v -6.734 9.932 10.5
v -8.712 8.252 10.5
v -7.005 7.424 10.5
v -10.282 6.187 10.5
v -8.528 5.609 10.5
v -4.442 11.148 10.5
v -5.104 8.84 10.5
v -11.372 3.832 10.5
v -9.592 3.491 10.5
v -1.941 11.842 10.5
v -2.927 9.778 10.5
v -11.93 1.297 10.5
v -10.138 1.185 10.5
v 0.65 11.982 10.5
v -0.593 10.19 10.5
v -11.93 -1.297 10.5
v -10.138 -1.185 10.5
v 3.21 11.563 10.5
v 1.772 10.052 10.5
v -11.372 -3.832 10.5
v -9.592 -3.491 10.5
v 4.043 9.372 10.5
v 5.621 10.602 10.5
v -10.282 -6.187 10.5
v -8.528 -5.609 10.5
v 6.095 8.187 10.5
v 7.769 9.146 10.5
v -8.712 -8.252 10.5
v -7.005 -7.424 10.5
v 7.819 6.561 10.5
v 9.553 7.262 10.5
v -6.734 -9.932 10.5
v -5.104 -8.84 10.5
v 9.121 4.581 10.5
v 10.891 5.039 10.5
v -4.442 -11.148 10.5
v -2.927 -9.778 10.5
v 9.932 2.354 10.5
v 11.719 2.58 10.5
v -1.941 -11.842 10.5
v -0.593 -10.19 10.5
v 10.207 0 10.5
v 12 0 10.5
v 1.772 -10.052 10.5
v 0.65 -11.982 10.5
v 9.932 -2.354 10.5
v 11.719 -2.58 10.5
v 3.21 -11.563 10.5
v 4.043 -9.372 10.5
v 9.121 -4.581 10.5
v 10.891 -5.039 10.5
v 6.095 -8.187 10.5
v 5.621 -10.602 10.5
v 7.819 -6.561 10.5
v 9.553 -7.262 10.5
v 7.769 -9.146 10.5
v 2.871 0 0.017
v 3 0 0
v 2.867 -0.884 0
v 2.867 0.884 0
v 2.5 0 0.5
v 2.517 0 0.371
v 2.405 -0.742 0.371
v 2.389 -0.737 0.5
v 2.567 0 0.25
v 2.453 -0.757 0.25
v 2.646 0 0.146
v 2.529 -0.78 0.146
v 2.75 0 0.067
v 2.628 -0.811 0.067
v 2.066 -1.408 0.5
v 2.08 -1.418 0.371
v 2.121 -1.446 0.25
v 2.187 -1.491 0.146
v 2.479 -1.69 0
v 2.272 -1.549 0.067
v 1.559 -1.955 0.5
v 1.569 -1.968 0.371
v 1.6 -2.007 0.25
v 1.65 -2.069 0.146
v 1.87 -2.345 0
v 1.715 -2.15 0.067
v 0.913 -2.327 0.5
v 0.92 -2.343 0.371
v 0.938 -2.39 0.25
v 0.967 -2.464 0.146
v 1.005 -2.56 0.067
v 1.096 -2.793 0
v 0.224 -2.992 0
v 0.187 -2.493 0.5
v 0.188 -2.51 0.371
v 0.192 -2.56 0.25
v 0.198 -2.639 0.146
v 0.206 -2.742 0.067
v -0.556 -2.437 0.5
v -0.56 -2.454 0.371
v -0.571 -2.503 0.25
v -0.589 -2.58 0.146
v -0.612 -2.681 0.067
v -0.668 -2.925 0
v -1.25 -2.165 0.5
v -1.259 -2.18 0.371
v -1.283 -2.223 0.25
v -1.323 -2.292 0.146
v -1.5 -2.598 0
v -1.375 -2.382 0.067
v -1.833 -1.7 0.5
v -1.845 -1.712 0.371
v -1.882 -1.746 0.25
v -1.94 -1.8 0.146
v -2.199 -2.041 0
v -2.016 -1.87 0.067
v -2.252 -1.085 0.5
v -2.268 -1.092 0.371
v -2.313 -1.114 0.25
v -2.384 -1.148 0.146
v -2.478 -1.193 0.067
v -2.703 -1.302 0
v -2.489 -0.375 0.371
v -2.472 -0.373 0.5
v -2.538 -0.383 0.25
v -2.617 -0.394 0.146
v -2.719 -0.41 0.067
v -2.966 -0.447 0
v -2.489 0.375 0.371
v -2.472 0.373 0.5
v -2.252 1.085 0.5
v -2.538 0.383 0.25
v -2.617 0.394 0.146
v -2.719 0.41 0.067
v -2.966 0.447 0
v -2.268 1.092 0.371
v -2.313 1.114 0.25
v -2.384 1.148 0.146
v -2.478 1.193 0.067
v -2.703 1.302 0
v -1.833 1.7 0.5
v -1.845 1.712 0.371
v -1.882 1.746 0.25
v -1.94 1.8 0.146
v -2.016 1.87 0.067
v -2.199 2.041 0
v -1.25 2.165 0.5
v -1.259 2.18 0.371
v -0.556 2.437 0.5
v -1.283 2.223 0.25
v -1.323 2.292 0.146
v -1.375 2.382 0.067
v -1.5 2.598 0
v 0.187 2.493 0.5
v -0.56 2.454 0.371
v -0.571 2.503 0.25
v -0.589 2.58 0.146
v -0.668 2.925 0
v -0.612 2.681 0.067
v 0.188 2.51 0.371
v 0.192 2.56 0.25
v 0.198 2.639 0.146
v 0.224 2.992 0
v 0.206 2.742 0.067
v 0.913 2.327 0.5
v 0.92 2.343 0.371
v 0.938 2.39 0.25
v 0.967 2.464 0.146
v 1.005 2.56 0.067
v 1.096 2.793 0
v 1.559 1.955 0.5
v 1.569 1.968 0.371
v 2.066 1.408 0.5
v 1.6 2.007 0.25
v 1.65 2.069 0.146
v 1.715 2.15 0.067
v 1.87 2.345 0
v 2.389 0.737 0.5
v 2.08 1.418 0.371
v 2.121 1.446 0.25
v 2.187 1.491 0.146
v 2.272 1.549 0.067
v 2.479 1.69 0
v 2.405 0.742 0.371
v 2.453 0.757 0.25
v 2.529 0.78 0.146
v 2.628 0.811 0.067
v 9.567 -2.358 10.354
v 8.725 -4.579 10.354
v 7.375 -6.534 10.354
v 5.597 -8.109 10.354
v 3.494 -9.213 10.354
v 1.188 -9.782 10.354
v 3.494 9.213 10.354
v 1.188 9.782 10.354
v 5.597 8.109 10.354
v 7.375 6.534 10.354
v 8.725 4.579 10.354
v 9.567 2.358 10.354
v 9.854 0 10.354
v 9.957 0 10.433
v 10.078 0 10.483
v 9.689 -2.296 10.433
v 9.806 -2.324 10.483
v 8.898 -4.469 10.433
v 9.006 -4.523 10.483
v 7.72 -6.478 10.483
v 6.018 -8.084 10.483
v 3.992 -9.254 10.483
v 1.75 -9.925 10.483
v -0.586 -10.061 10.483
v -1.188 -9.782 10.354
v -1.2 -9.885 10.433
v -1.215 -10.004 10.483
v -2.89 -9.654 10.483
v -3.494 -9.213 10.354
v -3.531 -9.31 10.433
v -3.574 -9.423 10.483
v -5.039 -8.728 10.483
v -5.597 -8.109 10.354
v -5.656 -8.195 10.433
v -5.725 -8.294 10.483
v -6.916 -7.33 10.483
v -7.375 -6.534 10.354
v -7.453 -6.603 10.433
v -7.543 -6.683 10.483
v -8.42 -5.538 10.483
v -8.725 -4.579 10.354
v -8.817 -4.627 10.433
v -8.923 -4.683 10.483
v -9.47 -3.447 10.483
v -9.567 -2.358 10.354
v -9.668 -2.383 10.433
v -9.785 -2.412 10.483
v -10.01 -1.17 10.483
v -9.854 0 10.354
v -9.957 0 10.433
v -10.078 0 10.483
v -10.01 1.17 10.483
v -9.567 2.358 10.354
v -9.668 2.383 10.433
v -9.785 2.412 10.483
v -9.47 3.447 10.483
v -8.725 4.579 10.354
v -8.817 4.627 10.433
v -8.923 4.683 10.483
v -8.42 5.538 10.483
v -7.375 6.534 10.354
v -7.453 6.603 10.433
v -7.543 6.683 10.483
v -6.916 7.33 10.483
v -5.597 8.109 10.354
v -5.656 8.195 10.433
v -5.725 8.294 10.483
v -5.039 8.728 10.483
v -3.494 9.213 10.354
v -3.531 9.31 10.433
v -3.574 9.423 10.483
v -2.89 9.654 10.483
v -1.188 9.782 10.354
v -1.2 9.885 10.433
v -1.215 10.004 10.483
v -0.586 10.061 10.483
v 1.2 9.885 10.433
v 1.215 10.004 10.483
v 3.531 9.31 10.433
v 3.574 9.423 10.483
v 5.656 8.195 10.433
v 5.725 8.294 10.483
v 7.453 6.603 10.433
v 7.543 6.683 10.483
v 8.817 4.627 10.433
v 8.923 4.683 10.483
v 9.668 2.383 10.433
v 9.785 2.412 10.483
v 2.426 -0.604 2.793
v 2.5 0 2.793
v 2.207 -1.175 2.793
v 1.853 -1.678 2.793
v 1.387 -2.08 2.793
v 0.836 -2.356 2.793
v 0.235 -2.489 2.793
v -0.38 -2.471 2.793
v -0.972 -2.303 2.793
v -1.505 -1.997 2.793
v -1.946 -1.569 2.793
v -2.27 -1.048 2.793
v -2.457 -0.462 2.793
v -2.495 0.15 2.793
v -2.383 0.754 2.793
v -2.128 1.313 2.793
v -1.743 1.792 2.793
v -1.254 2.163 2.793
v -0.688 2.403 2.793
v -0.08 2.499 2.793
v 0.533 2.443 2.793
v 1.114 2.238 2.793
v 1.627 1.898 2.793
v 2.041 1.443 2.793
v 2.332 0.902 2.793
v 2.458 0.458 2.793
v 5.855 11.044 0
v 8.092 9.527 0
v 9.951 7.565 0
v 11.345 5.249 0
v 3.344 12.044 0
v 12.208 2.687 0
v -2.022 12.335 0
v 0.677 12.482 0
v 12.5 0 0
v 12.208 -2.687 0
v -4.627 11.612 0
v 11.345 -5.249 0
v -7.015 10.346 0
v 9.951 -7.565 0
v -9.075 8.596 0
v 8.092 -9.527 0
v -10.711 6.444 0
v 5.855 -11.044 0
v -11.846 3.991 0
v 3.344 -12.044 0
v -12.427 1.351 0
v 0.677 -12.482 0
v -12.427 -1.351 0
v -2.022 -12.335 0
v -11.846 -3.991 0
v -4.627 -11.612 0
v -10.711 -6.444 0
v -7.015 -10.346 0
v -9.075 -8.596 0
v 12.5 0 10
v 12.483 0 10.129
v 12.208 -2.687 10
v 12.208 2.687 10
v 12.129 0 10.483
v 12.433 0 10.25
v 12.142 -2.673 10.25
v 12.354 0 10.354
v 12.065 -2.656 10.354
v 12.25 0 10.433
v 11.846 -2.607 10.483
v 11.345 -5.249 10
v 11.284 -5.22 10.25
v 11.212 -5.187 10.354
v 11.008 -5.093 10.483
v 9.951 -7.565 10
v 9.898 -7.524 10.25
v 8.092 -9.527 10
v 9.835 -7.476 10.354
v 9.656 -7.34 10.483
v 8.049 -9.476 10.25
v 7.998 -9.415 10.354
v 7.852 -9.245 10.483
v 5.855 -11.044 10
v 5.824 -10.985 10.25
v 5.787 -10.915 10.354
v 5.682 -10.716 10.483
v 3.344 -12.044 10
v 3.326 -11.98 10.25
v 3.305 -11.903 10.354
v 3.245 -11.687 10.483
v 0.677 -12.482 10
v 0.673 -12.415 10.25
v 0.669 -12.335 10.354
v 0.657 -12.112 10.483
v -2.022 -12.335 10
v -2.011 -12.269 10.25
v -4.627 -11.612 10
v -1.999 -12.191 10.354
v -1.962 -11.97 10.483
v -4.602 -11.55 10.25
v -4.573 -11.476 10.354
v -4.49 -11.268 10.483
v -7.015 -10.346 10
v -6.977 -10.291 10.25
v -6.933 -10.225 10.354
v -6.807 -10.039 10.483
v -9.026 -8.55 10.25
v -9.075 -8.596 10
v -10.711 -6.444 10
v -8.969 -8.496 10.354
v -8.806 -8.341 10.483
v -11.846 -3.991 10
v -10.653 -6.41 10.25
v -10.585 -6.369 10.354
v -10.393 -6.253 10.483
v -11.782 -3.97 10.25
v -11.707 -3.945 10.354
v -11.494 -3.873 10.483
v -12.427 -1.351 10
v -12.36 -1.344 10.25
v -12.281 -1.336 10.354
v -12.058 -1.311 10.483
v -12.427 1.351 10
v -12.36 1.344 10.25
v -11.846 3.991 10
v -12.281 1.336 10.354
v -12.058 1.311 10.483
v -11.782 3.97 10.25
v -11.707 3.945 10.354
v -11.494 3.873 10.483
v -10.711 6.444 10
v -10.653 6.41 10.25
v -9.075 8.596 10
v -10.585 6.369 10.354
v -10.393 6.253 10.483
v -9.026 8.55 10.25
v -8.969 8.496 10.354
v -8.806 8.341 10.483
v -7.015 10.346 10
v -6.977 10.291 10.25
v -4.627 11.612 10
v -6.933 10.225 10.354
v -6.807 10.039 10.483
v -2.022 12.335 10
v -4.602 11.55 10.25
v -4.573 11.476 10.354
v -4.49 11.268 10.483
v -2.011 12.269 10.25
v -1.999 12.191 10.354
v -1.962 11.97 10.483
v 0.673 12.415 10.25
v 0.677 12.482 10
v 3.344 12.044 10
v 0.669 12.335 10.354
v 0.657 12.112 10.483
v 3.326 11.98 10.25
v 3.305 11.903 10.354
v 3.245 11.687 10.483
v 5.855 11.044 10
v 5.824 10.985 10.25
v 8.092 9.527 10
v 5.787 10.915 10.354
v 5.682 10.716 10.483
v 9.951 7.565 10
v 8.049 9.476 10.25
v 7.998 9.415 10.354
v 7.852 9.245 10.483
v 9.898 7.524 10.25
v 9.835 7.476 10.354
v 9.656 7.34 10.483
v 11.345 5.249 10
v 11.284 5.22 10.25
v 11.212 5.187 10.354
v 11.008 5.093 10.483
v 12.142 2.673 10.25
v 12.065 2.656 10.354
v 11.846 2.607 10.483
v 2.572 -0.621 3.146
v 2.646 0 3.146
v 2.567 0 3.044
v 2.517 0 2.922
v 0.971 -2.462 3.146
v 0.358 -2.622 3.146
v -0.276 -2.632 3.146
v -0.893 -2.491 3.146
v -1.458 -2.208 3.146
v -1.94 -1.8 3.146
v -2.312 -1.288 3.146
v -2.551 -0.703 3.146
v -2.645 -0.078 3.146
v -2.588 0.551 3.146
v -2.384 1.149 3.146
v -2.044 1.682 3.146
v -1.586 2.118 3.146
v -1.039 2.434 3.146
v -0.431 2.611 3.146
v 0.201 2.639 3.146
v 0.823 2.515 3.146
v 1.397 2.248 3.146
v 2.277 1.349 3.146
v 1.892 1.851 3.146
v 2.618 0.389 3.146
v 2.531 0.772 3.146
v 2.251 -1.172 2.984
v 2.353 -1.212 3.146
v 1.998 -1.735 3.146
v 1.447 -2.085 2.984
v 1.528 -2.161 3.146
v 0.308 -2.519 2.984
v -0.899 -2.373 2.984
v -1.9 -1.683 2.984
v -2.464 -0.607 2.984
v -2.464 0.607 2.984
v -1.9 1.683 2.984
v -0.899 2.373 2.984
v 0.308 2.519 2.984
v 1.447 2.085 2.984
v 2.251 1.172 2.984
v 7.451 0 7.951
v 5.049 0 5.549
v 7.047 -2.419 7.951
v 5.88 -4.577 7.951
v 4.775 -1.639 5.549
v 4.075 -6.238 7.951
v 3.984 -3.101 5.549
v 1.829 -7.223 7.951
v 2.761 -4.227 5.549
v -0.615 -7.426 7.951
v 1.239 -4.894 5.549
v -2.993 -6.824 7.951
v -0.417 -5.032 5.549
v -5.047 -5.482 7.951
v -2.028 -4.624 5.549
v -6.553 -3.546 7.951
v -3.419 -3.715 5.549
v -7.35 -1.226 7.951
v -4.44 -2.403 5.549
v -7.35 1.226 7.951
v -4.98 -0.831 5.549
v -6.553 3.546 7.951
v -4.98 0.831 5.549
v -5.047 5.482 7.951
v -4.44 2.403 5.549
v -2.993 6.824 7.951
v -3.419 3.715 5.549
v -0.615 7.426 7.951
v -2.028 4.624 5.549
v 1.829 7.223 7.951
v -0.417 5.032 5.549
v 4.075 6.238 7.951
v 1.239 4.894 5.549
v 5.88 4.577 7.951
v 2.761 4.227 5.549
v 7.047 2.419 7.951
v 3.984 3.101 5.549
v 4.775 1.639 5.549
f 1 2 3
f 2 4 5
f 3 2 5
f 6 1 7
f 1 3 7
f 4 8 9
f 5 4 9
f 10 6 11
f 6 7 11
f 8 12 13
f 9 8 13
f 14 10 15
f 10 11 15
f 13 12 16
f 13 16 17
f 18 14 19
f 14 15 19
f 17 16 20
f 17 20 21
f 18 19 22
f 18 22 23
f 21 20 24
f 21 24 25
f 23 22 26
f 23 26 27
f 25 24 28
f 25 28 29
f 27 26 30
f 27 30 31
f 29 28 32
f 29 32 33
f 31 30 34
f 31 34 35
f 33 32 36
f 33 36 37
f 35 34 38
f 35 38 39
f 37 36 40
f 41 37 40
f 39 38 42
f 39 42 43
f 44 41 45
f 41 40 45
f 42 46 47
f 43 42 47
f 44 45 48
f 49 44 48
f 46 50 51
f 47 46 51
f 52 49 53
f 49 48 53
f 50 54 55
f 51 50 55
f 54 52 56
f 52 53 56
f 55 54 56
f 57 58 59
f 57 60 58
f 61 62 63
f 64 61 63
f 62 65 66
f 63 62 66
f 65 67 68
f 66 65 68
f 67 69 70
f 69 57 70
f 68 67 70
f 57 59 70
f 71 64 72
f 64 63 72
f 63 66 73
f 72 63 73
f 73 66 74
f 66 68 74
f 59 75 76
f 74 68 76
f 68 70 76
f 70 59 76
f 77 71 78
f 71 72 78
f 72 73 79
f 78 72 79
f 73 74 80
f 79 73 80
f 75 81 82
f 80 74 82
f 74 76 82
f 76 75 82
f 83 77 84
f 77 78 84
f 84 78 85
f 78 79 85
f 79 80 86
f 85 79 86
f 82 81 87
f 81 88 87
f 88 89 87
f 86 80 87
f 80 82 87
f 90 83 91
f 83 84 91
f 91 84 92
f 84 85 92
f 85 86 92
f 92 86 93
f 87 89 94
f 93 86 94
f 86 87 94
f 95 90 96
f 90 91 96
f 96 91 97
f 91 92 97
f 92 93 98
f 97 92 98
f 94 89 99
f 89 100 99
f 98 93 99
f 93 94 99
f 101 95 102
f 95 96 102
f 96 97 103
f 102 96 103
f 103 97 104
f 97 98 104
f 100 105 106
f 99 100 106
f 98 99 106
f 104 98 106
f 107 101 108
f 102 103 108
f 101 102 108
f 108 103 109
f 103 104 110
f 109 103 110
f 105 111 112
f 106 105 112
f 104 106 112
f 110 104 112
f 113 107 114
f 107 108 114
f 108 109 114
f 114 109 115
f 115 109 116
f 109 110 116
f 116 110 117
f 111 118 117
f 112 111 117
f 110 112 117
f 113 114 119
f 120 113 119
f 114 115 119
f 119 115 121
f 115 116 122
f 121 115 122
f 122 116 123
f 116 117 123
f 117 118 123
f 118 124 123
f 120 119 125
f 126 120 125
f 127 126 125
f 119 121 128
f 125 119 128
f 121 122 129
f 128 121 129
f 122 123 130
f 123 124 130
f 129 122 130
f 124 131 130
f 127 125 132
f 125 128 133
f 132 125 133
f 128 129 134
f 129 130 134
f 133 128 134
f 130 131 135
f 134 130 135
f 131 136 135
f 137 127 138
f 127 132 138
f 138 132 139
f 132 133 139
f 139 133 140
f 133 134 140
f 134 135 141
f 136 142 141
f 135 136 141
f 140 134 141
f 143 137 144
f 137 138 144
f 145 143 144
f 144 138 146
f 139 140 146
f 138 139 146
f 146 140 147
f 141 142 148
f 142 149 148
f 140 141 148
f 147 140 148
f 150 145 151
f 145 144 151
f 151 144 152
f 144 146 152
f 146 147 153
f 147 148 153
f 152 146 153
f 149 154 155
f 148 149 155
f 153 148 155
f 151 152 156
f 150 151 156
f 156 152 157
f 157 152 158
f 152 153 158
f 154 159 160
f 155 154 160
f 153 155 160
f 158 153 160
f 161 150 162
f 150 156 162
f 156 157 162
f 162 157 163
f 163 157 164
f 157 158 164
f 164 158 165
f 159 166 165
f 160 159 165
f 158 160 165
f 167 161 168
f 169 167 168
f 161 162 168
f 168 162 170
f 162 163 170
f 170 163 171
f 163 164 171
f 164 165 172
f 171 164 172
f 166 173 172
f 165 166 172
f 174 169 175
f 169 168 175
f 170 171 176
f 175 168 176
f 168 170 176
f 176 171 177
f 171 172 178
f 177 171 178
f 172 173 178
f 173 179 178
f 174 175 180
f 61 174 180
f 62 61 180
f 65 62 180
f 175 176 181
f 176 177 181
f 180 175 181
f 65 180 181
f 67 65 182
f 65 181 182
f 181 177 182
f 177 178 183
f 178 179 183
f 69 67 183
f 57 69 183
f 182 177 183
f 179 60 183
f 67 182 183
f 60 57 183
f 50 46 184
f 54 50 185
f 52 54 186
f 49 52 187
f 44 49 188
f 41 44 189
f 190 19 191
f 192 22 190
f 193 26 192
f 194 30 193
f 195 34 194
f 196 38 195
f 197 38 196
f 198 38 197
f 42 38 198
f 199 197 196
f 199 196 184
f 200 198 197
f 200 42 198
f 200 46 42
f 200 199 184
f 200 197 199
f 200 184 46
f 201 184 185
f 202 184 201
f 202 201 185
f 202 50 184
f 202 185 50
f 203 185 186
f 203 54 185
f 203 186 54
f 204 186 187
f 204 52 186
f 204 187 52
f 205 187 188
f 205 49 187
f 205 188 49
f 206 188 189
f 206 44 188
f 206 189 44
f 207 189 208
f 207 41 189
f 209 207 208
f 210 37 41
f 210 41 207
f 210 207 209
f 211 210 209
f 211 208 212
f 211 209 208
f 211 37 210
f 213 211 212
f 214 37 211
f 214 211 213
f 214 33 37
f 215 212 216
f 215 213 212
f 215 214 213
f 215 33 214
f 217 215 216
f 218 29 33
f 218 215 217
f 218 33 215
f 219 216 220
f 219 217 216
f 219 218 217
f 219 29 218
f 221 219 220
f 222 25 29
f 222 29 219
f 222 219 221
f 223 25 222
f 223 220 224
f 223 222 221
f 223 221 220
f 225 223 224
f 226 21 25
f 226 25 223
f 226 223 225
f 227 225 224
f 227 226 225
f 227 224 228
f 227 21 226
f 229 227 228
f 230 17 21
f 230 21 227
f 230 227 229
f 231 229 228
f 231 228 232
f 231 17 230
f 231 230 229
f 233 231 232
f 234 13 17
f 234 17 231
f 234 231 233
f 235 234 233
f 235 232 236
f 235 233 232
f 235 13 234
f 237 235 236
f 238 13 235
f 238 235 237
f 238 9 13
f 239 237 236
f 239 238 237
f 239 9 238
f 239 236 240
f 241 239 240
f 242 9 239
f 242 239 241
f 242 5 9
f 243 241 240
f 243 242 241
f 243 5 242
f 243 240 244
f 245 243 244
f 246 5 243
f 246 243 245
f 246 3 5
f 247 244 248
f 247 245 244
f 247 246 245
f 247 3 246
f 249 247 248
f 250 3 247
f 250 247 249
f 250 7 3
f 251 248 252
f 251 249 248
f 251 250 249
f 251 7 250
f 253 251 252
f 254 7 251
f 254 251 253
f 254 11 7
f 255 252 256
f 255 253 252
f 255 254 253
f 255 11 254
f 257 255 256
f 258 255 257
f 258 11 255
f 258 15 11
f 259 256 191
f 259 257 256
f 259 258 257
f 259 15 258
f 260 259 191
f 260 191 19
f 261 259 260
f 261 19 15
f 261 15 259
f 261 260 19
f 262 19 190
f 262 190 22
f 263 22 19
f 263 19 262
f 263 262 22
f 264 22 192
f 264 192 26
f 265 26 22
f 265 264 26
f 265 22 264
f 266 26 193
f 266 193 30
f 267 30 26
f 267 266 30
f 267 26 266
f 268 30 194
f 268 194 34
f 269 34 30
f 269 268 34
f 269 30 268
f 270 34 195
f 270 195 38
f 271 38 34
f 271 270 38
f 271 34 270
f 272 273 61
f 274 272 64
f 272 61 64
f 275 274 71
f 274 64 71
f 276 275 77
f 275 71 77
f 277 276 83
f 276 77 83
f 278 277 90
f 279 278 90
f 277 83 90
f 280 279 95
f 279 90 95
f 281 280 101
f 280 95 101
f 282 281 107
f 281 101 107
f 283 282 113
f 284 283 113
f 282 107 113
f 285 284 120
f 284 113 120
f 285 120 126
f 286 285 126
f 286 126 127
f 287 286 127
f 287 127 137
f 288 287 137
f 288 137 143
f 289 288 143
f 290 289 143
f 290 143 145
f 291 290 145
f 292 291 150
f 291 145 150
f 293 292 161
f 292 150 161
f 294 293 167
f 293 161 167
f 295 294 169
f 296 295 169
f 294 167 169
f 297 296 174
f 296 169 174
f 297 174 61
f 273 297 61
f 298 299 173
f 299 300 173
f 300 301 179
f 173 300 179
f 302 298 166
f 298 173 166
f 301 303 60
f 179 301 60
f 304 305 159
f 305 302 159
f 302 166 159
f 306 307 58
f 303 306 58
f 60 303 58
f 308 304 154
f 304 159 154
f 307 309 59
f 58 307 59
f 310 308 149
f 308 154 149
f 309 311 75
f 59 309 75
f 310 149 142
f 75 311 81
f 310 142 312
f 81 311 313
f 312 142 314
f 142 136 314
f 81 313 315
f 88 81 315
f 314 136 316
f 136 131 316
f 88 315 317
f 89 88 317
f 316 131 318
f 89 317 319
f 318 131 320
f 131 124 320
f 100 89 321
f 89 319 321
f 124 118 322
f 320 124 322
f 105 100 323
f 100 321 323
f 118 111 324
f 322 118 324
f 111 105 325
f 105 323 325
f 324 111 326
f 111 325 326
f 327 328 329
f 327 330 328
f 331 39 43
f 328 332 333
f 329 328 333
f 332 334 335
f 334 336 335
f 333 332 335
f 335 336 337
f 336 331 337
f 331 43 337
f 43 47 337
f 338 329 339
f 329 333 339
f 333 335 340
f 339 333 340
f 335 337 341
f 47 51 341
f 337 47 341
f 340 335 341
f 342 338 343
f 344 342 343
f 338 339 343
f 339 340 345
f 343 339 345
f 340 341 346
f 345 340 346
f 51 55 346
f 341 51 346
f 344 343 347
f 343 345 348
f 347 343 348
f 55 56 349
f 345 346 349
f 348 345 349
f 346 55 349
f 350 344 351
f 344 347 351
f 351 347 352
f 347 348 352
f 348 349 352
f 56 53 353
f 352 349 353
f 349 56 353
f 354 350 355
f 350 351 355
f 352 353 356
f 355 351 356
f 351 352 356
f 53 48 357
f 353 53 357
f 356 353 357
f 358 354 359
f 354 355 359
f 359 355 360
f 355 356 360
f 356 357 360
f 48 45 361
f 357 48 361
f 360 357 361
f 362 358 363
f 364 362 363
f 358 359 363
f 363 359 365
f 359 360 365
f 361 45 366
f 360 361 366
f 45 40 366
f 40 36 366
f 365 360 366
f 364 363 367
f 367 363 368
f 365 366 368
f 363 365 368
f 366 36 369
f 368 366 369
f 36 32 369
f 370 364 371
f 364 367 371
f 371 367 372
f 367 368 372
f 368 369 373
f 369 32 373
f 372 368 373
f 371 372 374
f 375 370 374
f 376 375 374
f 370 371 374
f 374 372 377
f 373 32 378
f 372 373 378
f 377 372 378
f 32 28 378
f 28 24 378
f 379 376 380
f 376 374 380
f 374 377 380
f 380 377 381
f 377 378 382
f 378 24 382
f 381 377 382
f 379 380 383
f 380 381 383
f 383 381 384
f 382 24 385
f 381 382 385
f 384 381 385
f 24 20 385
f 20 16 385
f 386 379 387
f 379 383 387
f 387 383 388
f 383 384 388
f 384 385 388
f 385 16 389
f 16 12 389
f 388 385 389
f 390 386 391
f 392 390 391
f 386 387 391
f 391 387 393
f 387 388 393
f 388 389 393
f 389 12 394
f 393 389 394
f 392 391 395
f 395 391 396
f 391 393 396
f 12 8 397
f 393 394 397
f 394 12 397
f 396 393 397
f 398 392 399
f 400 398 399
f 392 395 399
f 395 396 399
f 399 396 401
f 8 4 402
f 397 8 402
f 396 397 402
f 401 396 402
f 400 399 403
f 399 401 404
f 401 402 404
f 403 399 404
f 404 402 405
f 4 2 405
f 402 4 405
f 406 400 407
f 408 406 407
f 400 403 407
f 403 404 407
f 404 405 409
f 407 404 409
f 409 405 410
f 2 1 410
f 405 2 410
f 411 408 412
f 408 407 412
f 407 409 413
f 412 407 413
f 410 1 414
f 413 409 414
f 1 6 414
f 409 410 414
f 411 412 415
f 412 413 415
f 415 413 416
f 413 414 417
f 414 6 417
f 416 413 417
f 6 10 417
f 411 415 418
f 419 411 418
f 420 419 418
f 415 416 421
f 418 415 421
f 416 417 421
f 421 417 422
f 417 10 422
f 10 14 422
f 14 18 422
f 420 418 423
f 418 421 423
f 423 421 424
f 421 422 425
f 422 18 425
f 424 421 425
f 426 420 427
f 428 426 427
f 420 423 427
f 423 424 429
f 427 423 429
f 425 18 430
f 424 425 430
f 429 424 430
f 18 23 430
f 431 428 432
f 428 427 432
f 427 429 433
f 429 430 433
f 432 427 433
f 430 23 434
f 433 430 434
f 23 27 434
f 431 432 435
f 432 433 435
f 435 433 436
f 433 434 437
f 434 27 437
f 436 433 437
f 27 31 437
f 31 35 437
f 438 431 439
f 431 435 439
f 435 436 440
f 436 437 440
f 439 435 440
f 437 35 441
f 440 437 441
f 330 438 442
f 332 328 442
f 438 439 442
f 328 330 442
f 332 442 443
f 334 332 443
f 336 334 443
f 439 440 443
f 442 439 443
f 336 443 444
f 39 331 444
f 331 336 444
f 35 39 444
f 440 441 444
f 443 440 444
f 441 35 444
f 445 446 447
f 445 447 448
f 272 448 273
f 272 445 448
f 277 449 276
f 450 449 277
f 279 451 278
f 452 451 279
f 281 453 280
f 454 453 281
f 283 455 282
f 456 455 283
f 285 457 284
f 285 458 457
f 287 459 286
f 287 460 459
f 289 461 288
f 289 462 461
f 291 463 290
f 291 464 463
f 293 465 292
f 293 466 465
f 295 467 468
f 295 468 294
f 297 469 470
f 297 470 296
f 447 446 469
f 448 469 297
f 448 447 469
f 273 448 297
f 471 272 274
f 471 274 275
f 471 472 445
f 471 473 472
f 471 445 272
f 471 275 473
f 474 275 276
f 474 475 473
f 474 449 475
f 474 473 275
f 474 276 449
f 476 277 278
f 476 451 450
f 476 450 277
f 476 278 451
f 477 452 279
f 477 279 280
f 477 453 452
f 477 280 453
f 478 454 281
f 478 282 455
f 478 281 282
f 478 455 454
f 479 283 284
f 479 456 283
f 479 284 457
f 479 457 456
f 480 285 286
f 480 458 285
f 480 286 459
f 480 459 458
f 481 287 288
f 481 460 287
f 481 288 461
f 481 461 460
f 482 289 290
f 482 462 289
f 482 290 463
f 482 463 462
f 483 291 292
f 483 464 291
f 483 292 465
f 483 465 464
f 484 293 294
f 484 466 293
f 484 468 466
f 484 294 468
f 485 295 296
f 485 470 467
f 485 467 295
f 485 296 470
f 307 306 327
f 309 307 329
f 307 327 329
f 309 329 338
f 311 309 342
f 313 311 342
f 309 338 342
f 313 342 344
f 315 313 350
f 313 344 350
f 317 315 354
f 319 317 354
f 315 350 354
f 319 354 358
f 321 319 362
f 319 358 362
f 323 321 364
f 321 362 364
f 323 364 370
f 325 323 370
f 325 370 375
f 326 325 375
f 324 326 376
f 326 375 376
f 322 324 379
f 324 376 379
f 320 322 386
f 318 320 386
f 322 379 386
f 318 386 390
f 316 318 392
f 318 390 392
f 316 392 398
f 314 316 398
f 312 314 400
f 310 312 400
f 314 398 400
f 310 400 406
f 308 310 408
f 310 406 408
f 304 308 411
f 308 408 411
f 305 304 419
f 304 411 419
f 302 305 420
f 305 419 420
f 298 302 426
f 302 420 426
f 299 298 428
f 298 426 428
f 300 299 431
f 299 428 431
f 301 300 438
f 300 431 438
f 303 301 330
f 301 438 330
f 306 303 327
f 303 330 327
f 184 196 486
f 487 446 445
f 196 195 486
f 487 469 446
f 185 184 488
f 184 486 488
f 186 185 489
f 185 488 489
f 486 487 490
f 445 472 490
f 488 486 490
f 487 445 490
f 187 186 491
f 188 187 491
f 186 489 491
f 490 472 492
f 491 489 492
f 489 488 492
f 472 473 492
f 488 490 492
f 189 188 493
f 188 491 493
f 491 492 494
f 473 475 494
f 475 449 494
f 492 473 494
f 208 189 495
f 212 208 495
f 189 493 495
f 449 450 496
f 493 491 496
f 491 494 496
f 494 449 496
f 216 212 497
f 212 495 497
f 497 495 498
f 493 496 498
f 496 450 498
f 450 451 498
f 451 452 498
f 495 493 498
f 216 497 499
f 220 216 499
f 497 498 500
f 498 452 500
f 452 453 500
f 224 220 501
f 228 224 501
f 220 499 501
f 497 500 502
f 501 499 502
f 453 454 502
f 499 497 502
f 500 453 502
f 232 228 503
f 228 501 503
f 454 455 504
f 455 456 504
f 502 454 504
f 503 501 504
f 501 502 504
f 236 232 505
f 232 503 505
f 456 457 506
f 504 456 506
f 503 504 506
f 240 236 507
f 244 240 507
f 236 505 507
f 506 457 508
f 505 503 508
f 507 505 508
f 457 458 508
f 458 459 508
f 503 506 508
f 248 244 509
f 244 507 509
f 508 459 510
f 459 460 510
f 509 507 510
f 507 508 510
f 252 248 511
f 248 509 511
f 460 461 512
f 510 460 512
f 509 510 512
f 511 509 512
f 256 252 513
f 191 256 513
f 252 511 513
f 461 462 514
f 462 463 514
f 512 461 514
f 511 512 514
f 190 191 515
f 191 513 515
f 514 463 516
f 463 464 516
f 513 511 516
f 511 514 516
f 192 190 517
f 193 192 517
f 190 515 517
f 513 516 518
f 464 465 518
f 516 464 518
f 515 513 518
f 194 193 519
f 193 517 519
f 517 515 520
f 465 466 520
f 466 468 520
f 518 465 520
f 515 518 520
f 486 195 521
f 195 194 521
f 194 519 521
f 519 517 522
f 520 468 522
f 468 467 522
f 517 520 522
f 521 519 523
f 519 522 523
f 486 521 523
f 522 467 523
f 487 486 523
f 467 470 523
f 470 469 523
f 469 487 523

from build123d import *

# Parameters (mm, degrees)
F2_R = 0.5


with BuildPart() as f1:
    # F0 (on Front) → F1 (revolve)
    with BuildSketch(Plane.XZ):
        Polygon((10, 10.5), (2.5, 3), (2.5, 0), (12.5, 0), (12.5, 10.5), align=None)
    revolve(axis=Axis((0, 0, 15.3351295739), (0, 0, -1)))

    # F2
    f2_edges = [f1.edges().sort_by_distance(p)[0] for p in [
        (-12.5, 0, 10.5),
        (-10, 0, 10.5),
        (-2.5, 0, 3),
        (-2.5, 0, 0),
    ]]
    fillet(f2_edges, radius=F2_R)


solid = f1.part
